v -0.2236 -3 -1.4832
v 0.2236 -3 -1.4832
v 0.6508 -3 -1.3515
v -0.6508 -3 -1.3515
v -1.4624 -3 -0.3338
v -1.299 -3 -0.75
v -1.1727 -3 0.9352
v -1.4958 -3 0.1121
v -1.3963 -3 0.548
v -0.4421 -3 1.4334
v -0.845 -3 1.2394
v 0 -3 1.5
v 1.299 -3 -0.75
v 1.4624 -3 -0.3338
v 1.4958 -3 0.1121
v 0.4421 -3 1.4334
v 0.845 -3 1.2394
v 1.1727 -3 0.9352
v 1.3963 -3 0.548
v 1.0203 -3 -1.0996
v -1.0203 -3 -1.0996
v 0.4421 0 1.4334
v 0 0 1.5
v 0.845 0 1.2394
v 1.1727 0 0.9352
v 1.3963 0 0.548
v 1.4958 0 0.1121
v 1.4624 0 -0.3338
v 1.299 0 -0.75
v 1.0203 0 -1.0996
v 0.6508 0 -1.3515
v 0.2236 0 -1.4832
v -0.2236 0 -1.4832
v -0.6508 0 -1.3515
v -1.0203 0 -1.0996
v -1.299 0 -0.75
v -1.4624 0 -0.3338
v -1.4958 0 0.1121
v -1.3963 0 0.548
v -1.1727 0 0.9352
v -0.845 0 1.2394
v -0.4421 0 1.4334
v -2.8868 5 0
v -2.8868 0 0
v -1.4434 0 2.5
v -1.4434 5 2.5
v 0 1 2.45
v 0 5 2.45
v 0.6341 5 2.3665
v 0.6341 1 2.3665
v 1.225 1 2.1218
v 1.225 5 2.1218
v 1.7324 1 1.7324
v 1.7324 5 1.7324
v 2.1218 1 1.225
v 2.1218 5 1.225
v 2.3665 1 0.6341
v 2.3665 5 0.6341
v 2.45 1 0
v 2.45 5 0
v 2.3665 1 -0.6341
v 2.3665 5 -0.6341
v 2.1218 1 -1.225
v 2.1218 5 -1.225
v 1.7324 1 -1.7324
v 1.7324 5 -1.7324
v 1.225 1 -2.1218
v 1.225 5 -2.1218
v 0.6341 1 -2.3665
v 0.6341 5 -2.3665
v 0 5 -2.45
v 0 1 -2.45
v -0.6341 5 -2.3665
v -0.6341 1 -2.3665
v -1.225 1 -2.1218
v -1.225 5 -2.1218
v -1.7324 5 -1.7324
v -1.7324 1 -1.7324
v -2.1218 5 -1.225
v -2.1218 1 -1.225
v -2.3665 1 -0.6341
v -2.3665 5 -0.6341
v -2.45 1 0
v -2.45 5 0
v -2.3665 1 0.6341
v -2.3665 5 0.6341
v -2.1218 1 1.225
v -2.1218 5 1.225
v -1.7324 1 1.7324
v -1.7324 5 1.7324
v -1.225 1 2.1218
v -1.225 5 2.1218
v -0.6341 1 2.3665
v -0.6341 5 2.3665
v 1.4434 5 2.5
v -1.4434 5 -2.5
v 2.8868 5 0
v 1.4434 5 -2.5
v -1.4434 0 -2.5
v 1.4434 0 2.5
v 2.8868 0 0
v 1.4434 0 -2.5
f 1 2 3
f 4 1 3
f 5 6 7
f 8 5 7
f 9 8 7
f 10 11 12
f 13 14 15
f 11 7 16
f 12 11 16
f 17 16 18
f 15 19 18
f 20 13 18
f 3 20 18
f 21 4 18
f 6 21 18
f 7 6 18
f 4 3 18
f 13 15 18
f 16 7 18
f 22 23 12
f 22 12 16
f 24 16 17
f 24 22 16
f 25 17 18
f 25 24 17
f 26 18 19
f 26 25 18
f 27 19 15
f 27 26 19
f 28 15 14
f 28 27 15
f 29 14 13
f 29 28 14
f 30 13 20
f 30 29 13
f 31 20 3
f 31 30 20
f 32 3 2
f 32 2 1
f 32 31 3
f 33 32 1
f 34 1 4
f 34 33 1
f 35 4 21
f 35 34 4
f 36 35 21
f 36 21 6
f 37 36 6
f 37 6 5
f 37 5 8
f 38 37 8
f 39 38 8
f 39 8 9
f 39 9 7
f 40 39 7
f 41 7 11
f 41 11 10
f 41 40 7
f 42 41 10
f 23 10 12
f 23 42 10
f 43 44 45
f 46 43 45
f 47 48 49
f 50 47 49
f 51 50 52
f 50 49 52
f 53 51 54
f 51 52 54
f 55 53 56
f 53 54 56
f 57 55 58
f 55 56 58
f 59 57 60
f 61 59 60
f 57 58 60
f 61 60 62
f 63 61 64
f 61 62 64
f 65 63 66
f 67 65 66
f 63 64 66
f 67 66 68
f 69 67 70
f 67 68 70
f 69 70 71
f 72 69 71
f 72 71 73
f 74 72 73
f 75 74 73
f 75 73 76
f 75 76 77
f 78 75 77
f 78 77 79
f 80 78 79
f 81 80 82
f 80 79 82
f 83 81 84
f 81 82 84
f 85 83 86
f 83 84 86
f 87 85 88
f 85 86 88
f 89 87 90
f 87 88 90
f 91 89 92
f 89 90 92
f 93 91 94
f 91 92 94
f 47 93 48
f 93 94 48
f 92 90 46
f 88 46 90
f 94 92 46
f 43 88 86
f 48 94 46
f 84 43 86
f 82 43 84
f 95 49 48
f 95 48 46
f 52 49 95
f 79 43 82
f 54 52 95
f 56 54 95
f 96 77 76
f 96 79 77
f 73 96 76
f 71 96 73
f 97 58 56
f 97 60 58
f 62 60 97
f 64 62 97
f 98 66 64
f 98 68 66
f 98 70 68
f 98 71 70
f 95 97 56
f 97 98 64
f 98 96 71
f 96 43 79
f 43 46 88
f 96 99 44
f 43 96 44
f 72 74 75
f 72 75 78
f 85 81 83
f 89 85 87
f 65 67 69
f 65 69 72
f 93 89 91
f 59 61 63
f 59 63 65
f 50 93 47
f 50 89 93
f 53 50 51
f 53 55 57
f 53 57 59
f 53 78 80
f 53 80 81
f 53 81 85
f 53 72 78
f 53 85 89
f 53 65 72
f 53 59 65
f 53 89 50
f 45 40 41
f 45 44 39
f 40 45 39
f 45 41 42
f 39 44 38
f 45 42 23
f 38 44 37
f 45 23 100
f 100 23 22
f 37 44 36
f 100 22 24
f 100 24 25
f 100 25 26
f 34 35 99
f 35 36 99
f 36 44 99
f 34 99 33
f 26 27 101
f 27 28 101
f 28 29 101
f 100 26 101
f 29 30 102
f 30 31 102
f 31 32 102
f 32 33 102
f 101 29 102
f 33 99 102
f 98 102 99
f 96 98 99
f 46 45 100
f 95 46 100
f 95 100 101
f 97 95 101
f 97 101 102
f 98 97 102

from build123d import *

# Parameters (mm, degrees)
BOSS_EXTRUDE1_DEPTH = 5
CUT_EXTRUDE1_START  = 5
SKETCH2_R           = 2.45
CUT_EXTRUDE1_DEPTH  = 4
SKETCH3_R           = 1.5
BOSS_EXTRUDE2_DEPTH = 3


with BuildPart() as part:
    # Sketch1 → Boss-Extrude1 (new body)
    with BuildSketch(Plane(origin=(0, 0, 0), x_dir=(1, 0, 0), z_dir=(0, 1, 0))):
        Polygon((1.443375673, -2.5), (2.886751346, 0), (1.443375673, 2.5), (-1.443375673, 2.5), (-2.886751346, 0), (-1.443375673, -2.5), align=None)
    extrude(amount=BOSS_EXTRUDE1_DEPTH)

    # Sketch2 → Cut-Extrude1 (cut)
    with BuildSketch(Plane(origin=(0, 0, 0), x_dir=(1, 0, 0), z_dir=(0, 1, 0)).offset(CUT_EXTRUDE1_START)):
        with Locations(Location((0, 0, 0), (0, 0, 270))):
            Circle(SKETCH2_R)
    extrude(amount=-CUT_EXTRUDE1_DEPTH, mode=Mode.SUBTRACT)

    # Sketch3 → Boss-Extrude2 (add)
    with BuildSketch(Plane(origin=(0, 0, 0), x_dir=(1, 0, 0), z_dir=(0, 1, 0))):
        with Locations(Location((0, 0, 0), (0, 0, 270))):
            Circle(SKETCH3_R)
    extrude(amount=-BOSS_EXTRUDE2_DEPTH)


solid = part.part
